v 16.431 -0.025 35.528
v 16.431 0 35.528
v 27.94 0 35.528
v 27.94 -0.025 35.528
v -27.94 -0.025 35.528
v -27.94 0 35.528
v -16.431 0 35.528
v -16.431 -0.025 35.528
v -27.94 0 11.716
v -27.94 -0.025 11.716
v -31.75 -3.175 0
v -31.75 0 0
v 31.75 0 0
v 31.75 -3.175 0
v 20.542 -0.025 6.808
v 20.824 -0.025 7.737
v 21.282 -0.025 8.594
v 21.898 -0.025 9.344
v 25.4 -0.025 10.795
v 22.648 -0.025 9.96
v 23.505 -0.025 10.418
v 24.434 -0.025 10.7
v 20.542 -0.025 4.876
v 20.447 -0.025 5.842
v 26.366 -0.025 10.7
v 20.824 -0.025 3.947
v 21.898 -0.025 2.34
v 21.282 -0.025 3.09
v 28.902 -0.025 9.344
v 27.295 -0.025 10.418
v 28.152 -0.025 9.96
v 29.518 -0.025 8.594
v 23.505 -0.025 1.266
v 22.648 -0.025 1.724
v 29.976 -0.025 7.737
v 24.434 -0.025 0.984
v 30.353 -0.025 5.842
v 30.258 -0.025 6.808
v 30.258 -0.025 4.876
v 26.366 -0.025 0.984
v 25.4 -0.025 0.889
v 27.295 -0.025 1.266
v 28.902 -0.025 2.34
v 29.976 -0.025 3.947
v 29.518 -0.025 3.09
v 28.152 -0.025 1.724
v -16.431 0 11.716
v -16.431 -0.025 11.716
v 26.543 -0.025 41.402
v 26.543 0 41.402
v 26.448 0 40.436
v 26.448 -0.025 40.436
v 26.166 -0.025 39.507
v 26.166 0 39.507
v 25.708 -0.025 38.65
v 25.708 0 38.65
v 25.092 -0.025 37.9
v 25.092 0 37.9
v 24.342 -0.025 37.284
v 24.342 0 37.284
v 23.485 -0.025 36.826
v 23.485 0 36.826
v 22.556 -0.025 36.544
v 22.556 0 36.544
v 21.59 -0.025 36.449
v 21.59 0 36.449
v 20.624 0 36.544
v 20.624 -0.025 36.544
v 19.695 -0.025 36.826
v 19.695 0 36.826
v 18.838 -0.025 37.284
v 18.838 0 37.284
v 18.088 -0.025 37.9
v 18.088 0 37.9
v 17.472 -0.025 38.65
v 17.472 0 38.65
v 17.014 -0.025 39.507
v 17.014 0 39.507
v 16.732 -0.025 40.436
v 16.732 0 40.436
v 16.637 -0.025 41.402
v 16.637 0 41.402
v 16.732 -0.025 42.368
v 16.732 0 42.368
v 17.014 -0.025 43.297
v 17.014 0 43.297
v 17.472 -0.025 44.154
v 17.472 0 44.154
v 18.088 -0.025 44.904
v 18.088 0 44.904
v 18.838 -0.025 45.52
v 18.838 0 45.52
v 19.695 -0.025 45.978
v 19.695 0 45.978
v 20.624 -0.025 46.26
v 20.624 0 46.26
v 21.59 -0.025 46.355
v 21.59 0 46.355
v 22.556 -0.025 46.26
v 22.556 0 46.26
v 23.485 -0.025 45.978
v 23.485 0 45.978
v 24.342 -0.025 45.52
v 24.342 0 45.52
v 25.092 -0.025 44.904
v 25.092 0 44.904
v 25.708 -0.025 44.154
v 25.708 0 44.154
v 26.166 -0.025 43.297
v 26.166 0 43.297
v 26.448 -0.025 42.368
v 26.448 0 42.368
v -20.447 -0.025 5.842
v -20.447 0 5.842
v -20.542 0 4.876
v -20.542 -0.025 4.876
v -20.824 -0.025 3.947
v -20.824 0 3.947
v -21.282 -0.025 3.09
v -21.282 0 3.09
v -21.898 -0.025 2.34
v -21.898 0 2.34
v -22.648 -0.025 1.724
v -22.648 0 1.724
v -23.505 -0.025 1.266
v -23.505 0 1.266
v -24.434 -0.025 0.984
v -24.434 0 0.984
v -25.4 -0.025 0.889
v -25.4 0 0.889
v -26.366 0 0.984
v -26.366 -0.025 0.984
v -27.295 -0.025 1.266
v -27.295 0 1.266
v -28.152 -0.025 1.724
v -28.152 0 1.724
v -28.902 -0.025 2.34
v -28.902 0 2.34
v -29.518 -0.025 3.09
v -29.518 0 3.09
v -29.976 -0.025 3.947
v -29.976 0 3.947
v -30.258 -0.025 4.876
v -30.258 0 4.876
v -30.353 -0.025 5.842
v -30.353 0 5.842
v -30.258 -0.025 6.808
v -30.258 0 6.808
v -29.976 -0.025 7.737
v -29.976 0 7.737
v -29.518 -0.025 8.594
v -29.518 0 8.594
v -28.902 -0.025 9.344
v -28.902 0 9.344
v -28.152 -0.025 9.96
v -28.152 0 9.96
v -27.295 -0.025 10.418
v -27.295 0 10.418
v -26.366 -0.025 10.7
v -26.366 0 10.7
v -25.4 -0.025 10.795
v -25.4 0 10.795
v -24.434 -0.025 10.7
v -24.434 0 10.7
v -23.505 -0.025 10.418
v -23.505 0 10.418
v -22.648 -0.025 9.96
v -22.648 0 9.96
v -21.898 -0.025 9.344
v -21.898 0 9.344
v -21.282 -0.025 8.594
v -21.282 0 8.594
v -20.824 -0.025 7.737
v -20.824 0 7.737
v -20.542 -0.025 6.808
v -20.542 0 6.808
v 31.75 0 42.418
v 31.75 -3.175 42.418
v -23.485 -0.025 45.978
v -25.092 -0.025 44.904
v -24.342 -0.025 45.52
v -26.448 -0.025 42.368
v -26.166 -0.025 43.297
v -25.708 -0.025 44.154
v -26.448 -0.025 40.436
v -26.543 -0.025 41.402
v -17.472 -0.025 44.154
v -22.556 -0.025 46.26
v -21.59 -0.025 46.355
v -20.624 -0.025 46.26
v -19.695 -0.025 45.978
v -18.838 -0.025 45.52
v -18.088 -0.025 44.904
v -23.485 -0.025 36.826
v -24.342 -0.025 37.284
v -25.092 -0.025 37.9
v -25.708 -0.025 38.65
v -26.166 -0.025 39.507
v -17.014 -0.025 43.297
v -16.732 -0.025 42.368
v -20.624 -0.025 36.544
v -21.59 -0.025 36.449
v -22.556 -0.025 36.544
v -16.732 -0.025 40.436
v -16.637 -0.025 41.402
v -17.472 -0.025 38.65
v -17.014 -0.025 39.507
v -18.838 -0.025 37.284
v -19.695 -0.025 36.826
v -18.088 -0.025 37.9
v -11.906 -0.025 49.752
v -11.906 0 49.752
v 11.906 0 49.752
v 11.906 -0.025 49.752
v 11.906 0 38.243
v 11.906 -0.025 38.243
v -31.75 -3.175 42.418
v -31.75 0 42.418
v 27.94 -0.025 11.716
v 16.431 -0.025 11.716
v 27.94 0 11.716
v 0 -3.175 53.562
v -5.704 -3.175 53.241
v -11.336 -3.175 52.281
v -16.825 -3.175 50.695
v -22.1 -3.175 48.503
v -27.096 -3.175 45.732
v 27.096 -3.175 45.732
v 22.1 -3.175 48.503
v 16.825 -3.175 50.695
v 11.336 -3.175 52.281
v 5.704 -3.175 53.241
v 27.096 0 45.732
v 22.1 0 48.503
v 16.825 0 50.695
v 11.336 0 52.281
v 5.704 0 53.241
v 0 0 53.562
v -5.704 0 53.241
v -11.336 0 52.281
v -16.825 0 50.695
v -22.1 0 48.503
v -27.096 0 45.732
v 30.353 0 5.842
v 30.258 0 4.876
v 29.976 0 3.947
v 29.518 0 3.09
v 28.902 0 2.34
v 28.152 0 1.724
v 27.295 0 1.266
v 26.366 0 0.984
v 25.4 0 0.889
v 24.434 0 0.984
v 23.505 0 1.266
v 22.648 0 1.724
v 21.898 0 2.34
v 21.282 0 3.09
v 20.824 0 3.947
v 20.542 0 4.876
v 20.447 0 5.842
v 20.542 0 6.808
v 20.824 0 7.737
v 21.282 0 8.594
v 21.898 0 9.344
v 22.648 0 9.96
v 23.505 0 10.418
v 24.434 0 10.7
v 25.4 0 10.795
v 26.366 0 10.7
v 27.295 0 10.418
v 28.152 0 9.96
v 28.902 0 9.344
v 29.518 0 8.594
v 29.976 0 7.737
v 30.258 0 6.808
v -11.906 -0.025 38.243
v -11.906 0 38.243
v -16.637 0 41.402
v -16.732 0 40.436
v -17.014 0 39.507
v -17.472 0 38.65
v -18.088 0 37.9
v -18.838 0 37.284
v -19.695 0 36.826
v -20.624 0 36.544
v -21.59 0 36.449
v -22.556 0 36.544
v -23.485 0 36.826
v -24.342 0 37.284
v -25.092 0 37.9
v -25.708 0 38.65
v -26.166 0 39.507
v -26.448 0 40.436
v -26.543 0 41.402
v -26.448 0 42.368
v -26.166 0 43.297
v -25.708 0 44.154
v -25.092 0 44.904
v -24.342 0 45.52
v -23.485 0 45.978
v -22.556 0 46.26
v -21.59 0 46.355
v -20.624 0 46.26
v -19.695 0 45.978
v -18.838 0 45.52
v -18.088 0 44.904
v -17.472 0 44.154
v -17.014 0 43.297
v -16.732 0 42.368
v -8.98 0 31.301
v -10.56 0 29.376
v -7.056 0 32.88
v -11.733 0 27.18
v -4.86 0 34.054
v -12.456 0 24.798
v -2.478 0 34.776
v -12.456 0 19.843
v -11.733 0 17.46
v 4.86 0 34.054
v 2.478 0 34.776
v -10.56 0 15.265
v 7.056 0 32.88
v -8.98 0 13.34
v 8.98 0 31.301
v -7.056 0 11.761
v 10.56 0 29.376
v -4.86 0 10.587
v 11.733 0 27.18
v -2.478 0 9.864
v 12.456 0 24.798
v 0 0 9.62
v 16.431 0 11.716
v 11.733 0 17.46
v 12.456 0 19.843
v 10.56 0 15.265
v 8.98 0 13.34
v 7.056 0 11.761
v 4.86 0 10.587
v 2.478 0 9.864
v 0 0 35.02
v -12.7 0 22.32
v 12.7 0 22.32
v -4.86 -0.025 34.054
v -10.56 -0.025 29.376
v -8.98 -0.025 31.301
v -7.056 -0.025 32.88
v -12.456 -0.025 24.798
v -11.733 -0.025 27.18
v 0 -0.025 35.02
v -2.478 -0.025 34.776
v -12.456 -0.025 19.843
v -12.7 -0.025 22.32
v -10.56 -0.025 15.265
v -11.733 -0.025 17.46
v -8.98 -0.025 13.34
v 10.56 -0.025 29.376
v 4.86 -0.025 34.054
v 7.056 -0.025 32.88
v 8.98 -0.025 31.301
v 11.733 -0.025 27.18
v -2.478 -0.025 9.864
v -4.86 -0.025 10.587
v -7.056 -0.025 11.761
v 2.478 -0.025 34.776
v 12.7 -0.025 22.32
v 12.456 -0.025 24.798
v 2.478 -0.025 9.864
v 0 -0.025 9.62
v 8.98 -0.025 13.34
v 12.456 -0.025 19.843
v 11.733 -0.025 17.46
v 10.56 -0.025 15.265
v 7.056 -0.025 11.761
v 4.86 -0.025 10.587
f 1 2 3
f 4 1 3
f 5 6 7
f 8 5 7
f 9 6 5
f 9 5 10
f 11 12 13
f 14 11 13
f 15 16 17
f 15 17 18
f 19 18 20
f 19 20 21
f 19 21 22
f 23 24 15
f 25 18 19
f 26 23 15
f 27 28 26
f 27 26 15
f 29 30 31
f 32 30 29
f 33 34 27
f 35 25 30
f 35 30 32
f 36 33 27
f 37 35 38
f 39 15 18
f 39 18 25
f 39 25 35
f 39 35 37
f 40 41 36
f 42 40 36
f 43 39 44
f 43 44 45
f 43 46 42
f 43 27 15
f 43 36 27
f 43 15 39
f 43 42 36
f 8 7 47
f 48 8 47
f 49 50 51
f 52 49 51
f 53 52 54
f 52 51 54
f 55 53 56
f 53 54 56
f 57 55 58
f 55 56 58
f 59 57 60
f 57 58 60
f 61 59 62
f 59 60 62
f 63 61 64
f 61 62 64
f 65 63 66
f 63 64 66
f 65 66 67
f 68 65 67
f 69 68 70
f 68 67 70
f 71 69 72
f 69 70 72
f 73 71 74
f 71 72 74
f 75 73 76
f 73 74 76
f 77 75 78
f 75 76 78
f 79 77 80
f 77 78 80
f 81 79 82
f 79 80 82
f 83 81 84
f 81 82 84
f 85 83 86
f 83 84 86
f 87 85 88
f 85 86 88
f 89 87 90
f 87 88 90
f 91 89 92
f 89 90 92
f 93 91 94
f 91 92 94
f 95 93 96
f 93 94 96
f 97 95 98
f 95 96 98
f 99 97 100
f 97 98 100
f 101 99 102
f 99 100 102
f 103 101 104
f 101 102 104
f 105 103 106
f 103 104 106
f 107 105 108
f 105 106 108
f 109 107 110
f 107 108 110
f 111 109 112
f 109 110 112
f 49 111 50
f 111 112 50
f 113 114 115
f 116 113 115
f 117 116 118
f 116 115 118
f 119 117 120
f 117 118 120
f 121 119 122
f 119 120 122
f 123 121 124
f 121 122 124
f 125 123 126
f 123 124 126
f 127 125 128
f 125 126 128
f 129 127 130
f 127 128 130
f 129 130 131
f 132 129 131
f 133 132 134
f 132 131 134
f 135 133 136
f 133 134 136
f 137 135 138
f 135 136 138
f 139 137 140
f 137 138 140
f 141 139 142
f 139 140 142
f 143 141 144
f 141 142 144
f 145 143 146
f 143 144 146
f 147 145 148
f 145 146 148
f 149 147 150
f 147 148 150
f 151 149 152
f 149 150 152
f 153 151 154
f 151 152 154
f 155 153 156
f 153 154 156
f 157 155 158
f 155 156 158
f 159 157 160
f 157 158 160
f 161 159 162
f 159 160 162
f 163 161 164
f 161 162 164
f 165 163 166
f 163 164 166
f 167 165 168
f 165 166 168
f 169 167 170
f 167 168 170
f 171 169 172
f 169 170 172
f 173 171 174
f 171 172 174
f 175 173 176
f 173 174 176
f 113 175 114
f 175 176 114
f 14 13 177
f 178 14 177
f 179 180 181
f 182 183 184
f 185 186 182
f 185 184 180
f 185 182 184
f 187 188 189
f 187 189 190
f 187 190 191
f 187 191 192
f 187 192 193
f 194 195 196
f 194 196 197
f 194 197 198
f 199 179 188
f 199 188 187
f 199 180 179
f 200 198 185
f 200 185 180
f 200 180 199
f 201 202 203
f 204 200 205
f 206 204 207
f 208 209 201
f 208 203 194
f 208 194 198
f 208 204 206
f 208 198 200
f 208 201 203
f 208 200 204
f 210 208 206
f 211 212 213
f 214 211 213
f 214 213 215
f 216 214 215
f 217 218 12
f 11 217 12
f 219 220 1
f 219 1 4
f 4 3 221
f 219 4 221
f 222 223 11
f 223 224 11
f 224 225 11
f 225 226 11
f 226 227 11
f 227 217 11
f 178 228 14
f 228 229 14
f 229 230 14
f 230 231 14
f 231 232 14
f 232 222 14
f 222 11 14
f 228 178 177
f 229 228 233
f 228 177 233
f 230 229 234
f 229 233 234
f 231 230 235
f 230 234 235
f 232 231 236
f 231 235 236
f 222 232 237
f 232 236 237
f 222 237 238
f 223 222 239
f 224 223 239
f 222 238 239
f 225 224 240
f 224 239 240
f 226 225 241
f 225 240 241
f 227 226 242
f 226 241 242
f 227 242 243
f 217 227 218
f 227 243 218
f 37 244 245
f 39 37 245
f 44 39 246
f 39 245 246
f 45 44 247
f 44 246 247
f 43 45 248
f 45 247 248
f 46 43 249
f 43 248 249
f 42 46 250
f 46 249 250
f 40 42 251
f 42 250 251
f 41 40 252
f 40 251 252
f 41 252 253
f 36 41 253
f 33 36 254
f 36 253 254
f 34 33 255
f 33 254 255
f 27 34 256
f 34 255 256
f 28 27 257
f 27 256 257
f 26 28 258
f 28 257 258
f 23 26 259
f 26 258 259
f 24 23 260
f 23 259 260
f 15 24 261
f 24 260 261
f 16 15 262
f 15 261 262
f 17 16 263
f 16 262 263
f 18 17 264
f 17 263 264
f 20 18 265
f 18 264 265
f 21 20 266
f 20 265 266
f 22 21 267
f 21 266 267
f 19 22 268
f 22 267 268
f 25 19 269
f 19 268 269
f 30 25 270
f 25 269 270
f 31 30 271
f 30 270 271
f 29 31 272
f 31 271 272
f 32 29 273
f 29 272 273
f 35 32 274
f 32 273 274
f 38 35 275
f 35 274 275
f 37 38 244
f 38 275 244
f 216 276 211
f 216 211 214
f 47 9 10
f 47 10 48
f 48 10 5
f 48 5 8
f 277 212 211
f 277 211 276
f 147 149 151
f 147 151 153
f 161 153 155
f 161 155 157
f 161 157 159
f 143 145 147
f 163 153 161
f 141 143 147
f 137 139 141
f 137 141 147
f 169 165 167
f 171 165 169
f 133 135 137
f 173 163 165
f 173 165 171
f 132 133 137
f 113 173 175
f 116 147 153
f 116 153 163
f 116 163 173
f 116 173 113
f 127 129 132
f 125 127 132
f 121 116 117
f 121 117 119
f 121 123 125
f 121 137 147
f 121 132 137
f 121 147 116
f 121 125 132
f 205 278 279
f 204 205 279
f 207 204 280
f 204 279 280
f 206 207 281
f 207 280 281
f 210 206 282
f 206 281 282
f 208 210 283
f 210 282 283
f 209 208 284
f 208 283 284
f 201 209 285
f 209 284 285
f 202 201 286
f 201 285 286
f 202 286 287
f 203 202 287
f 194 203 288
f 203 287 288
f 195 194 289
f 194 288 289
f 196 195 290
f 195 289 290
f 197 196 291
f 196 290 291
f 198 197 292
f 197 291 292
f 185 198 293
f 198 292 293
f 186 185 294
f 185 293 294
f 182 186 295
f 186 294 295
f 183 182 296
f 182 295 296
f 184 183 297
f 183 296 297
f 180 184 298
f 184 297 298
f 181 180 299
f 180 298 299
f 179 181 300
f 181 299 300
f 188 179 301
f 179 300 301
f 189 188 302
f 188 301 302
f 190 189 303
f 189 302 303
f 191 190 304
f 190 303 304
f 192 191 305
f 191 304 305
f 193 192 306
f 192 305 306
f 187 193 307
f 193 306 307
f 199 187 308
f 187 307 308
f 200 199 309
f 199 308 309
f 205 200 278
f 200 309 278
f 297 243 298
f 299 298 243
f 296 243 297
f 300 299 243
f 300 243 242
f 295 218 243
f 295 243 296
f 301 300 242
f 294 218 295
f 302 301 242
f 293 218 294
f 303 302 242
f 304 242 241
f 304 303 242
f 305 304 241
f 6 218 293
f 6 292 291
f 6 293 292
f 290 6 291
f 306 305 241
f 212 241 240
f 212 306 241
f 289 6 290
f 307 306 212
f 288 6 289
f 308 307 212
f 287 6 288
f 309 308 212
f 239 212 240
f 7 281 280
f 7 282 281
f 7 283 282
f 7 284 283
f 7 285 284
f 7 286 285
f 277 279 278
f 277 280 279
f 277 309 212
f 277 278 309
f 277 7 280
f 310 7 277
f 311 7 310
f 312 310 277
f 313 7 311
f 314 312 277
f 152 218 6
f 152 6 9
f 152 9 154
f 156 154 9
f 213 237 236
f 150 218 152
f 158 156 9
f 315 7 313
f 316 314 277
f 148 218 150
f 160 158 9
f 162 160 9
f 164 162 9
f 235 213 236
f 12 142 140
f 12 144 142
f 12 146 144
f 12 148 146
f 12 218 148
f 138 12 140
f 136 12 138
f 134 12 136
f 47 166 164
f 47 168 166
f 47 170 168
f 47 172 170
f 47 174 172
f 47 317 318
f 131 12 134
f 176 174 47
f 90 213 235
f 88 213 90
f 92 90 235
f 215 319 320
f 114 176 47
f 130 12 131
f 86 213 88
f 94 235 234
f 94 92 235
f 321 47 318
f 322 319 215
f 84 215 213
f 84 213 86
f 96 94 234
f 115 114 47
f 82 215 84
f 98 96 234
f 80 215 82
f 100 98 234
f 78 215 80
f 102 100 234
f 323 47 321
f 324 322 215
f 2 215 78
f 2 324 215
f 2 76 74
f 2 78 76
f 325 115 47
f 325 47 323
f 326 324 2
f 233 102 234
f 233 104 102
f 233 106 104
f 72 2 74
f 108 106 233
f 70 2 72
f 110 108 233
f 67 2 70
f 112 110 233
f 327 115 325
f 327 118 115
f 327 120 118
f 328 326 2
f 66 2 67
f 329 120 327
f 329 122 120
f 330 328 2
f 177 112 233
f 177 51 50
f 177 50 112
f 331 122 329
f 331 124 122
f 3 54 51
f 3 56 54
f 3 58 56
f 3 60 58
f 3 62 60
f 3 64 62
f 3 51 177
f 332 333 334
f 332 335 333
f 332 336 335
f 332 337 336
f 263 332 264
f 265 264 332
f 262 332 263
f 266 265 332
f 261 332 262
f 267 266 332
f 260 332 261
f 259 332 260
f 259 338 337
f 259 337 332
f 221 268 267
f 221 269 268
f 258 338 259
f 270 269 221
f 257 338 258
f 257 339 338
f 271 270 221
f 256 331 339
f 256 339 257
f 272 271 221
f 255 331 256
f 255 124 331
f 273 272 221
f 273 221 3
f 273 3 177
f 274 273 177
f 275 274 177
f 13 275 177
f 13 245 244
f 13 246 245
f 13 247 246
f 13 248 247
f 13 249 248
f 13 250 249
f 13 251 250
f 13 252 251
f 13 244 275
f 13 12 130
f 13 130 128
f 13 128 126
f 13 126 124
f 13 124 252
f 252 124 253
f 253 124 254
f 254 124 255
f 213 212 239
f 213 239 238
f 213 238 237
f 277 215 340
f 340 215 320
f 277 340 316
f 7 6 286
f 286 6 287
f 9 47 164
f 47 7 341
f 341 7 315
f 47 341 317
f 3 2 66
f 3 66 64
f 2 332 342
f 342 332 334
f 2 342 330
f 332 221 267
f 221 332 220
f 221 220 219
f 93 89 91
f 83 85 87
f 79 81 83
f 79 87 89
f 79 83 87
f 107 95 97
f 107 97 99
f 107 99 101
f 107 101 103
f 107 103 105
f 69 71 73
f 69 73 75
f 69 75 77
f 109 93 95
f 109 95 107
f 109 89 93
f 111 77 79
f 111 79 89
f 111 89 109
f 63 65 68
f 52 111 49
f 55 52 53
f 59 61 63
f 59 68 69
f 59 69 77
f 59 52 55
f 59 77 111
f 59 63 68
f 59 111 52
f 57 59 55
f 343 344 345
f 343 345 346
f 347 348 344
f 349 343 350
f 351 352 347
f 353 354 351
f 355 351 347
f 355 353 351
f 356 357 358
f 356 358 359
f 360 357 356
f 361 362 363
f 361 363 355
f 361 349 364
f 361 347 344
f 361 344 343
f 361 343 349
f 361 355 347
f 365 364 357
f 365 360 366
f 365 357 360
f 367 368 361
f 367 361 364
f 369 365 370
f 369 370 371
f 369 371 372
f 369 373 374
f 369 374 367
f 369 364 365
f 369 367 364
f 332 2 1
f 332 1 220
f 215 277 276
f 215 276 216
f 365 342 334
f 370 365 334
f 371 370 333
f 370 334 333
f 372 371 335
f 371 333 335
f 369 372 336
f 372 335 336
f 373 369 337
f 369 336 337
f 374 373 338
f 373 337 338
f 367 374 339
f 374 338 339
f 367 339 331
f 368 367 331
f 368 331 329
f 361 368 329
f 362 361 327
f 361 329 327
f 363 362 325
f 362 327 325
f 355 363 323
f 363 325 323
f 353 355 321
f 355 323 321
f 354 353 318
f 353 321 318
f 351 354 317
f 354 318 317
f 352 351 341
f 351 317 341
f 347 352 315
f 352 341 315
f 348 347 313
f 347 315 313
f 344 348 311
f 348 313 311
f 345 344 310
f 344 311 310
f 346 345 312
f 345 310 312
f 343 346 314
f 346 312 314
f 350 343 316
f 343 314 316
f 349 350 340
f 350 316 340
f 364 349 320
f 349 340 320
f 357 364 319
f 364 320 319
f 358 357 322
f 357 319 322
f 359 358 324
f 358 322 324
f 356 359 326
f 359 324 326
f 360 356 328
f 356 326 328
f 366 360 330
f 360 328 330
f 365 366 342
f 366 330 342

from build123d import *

# Parameters (mm, degrees)
BOSS_EXTRUDE1_DEPTH  = 12.7
BOSS_EXTRUDE2_DEPTH  = 11.176
BOSS_EXTRUDE10_DEPTH = 3.175
SKETCH22_W           = 92.185700808
SKETCH22_H           = 89.424577416
CUT_EXTRUDE13_DEPTH  = 26.4
SKETCH26_W           = 63.5
SKETCH26_H           = 12.7
BOSS_EXTRUDE11_DEPTH = 3.175
SKETCH23_R           = 4.953
SKETCH23_R_2         = 12.7
CUT_EXTRUDE14_DEPTH  = 0.0254
SKETCH25_W           = 11.509375
SKETCH25_H           = 23.8125
SKETCH25_W_2         = 23.8125
SKETCH25_H_2         = 11.509375
CUT_EXTRUDE15_DEPTH  = 0.0254
SKETCH27_W           = 63.5
SKETCH27_H           = 12.7
CUT_EXTRUDE16_DEPTH  = 4.175


with BuildPart() as part:
    # Sketch1 → Boss-Extrude1 (new body)
    with BuildSketch(Plane(origin=(0, 0, 0), x_dir=(1, 0, 0), z_dir=(0, 1, 0))):
        with BuildLine():
            Line((-31.75, 0), (31.75, 0))
            Line((31.75, 0), (31.75, -42.418))
            ThreePointArc((31.75, -42.418), (0, -53.56226271), (-31.75, -42.418))
            Line((-31.75, -42.418), (-31.75, 0))
        make_face()
    extrude(amount=BOSS_EXTRUDE1_DEPTH)

    # Sketch2 → Boss-Extrude2 (add)
    with BuildSketch(Plane.ZY.offset(19.558)):
        with BuildLine():
            Line((0, 0), (-12.7, 0))
            ThreePointArc((-12.7, 0), (-21.680256121, 21.680256121), (0, 12.7))
            Line((0, 12.7), (0, 0))
        make_face()
    boss_extrude2 = extrude(amount=-BOSS_EXTRUDE2_DEPTH)

    # Mirror1: Boss-Extrude2 across plane
    add(boss_extrude2.mirror(Plane(origin=(0, 0, 0), x_dir=(0, 0, 1), z_dir=(1, 0, 0))))

    # Sketch20 → Boss-Extrude10 (add)
    with BuildSketch(Plane.XZ):
        with BuildLine():
            Line((-31.75, 42.418), (-31.75, 0))
            Line((-31.75, 0), (-19.558, 0))
            Line((-19.558, 0), (-19.558, -12.7))
            Line((-19.558, -12.7), (-8.382, -12.7))
            Line((-8.382, -12.7), (-8.382, 0))
            Line((-8.382, 0), (8.382, 0))
            Line((8.382, 0), (8.382, -12.7))
            Line((8.382, -12.7), (19.558, -12.7))
            Line((19.558, -12.7), (19.558, 0))
            Line((19.558, 0), (31.75, 0))
            Line((31.75, 0), (31.75, 42.418))
            ThreePointArc((31.75, 42.418), (0, 53.56226271), (-31.75, 42.418))
        make_face()
    extrude(amount=BOSS_EXTRUDE10_DEPTH)

    # Sketch22 → Cut-Extrude13 (cut, through all)
    with BuildSketch(Plane(origin=(0, 0, 0), x_dir=(-1, 0, 0), z_dir=(0, -1, 0))):
        with Locations((-2.135876507, -13.211147217)):
            Rectangle(SKETCH22_W, SKETCH22_H)
    extrude(amount=-CUT_EXTRUDE13_DEPTH, mode=Mode.SUBTRACT)

    # Sketch26 → Boss-Extrude11 (add)
    with BuildSketch(Plane(origin=(0, 0, 0), x_dir=(1, 0, 0), z_dir=(0, 1, 0))):
        with Locations((0, 6.35)):
            Rectangle(SKETCH26_W, SKETCH26_H)
    extrude(amount=-BOSS_EXTRUDE11_DEPTH)

    # Sketch23 → Cut-Extrude14 (cut)
    with BuildSketch(Plane(origin=(0, 0, 0), x_dir=(1, 0, 0), z_dir=(0, 1, 0))):
        with Locations((25.4, -5.842)):
            Circle(SKETCH23_R)
        with Locations((21.59, -41.402)):
            Circle(SKETCH23_R)
        with Locations((-25.4, -5.842)):
            Circle(SKETCH23_R)
        with Locations((-21.59, -41.402)):
            Circle(SKETCH23_R)
        with Locations((0, -22.32026271)):
            Circle(SKETCH23_R_2)
    extrude(amount=-CUT_EXTRUDE14_DEPTH, mode=Mode.SUBTRACT)

    # Sketch25 → Cut-Extrude15 (cut)
    with BuildSketch(Plane(origin=(0, 0, 0), x_dir=(1, 0, 0), z_dir=(0, 1, 0))):
        with Locations((-22.1853125, -23.62201271)):
            Rectangle(SKETCH25_W, SKETCH25_H)
        with Locations((0, -43.99757521)):
            Rectangle(SKETCH25_W_2, SKETCH25_H_2)
        with Locations((22.1853125, -23.62201271)):
            Rectangle(SKETCH25_W, SKETCH25_H)
    extrude(amount=-CUT_EXTRUDE15_DEPTH, mode=Mode.SUBTRACT)

    # Sketch27 → Cut-Extrude16 (cut, through all)
    with BuildSketch(Plane(origin=(0, 0, 0), x_dir=(1, 0, 0), z_dir=(0, 1, 0))):
        with Locations((0, 6.35)):
            Rectangle(SKETCH27_W, SKETCH27_H)
    extrude(amount=-CUT_EXTRUDE16_DEPTH, mode=Mode.SUBTRACT)


solid = part.part
